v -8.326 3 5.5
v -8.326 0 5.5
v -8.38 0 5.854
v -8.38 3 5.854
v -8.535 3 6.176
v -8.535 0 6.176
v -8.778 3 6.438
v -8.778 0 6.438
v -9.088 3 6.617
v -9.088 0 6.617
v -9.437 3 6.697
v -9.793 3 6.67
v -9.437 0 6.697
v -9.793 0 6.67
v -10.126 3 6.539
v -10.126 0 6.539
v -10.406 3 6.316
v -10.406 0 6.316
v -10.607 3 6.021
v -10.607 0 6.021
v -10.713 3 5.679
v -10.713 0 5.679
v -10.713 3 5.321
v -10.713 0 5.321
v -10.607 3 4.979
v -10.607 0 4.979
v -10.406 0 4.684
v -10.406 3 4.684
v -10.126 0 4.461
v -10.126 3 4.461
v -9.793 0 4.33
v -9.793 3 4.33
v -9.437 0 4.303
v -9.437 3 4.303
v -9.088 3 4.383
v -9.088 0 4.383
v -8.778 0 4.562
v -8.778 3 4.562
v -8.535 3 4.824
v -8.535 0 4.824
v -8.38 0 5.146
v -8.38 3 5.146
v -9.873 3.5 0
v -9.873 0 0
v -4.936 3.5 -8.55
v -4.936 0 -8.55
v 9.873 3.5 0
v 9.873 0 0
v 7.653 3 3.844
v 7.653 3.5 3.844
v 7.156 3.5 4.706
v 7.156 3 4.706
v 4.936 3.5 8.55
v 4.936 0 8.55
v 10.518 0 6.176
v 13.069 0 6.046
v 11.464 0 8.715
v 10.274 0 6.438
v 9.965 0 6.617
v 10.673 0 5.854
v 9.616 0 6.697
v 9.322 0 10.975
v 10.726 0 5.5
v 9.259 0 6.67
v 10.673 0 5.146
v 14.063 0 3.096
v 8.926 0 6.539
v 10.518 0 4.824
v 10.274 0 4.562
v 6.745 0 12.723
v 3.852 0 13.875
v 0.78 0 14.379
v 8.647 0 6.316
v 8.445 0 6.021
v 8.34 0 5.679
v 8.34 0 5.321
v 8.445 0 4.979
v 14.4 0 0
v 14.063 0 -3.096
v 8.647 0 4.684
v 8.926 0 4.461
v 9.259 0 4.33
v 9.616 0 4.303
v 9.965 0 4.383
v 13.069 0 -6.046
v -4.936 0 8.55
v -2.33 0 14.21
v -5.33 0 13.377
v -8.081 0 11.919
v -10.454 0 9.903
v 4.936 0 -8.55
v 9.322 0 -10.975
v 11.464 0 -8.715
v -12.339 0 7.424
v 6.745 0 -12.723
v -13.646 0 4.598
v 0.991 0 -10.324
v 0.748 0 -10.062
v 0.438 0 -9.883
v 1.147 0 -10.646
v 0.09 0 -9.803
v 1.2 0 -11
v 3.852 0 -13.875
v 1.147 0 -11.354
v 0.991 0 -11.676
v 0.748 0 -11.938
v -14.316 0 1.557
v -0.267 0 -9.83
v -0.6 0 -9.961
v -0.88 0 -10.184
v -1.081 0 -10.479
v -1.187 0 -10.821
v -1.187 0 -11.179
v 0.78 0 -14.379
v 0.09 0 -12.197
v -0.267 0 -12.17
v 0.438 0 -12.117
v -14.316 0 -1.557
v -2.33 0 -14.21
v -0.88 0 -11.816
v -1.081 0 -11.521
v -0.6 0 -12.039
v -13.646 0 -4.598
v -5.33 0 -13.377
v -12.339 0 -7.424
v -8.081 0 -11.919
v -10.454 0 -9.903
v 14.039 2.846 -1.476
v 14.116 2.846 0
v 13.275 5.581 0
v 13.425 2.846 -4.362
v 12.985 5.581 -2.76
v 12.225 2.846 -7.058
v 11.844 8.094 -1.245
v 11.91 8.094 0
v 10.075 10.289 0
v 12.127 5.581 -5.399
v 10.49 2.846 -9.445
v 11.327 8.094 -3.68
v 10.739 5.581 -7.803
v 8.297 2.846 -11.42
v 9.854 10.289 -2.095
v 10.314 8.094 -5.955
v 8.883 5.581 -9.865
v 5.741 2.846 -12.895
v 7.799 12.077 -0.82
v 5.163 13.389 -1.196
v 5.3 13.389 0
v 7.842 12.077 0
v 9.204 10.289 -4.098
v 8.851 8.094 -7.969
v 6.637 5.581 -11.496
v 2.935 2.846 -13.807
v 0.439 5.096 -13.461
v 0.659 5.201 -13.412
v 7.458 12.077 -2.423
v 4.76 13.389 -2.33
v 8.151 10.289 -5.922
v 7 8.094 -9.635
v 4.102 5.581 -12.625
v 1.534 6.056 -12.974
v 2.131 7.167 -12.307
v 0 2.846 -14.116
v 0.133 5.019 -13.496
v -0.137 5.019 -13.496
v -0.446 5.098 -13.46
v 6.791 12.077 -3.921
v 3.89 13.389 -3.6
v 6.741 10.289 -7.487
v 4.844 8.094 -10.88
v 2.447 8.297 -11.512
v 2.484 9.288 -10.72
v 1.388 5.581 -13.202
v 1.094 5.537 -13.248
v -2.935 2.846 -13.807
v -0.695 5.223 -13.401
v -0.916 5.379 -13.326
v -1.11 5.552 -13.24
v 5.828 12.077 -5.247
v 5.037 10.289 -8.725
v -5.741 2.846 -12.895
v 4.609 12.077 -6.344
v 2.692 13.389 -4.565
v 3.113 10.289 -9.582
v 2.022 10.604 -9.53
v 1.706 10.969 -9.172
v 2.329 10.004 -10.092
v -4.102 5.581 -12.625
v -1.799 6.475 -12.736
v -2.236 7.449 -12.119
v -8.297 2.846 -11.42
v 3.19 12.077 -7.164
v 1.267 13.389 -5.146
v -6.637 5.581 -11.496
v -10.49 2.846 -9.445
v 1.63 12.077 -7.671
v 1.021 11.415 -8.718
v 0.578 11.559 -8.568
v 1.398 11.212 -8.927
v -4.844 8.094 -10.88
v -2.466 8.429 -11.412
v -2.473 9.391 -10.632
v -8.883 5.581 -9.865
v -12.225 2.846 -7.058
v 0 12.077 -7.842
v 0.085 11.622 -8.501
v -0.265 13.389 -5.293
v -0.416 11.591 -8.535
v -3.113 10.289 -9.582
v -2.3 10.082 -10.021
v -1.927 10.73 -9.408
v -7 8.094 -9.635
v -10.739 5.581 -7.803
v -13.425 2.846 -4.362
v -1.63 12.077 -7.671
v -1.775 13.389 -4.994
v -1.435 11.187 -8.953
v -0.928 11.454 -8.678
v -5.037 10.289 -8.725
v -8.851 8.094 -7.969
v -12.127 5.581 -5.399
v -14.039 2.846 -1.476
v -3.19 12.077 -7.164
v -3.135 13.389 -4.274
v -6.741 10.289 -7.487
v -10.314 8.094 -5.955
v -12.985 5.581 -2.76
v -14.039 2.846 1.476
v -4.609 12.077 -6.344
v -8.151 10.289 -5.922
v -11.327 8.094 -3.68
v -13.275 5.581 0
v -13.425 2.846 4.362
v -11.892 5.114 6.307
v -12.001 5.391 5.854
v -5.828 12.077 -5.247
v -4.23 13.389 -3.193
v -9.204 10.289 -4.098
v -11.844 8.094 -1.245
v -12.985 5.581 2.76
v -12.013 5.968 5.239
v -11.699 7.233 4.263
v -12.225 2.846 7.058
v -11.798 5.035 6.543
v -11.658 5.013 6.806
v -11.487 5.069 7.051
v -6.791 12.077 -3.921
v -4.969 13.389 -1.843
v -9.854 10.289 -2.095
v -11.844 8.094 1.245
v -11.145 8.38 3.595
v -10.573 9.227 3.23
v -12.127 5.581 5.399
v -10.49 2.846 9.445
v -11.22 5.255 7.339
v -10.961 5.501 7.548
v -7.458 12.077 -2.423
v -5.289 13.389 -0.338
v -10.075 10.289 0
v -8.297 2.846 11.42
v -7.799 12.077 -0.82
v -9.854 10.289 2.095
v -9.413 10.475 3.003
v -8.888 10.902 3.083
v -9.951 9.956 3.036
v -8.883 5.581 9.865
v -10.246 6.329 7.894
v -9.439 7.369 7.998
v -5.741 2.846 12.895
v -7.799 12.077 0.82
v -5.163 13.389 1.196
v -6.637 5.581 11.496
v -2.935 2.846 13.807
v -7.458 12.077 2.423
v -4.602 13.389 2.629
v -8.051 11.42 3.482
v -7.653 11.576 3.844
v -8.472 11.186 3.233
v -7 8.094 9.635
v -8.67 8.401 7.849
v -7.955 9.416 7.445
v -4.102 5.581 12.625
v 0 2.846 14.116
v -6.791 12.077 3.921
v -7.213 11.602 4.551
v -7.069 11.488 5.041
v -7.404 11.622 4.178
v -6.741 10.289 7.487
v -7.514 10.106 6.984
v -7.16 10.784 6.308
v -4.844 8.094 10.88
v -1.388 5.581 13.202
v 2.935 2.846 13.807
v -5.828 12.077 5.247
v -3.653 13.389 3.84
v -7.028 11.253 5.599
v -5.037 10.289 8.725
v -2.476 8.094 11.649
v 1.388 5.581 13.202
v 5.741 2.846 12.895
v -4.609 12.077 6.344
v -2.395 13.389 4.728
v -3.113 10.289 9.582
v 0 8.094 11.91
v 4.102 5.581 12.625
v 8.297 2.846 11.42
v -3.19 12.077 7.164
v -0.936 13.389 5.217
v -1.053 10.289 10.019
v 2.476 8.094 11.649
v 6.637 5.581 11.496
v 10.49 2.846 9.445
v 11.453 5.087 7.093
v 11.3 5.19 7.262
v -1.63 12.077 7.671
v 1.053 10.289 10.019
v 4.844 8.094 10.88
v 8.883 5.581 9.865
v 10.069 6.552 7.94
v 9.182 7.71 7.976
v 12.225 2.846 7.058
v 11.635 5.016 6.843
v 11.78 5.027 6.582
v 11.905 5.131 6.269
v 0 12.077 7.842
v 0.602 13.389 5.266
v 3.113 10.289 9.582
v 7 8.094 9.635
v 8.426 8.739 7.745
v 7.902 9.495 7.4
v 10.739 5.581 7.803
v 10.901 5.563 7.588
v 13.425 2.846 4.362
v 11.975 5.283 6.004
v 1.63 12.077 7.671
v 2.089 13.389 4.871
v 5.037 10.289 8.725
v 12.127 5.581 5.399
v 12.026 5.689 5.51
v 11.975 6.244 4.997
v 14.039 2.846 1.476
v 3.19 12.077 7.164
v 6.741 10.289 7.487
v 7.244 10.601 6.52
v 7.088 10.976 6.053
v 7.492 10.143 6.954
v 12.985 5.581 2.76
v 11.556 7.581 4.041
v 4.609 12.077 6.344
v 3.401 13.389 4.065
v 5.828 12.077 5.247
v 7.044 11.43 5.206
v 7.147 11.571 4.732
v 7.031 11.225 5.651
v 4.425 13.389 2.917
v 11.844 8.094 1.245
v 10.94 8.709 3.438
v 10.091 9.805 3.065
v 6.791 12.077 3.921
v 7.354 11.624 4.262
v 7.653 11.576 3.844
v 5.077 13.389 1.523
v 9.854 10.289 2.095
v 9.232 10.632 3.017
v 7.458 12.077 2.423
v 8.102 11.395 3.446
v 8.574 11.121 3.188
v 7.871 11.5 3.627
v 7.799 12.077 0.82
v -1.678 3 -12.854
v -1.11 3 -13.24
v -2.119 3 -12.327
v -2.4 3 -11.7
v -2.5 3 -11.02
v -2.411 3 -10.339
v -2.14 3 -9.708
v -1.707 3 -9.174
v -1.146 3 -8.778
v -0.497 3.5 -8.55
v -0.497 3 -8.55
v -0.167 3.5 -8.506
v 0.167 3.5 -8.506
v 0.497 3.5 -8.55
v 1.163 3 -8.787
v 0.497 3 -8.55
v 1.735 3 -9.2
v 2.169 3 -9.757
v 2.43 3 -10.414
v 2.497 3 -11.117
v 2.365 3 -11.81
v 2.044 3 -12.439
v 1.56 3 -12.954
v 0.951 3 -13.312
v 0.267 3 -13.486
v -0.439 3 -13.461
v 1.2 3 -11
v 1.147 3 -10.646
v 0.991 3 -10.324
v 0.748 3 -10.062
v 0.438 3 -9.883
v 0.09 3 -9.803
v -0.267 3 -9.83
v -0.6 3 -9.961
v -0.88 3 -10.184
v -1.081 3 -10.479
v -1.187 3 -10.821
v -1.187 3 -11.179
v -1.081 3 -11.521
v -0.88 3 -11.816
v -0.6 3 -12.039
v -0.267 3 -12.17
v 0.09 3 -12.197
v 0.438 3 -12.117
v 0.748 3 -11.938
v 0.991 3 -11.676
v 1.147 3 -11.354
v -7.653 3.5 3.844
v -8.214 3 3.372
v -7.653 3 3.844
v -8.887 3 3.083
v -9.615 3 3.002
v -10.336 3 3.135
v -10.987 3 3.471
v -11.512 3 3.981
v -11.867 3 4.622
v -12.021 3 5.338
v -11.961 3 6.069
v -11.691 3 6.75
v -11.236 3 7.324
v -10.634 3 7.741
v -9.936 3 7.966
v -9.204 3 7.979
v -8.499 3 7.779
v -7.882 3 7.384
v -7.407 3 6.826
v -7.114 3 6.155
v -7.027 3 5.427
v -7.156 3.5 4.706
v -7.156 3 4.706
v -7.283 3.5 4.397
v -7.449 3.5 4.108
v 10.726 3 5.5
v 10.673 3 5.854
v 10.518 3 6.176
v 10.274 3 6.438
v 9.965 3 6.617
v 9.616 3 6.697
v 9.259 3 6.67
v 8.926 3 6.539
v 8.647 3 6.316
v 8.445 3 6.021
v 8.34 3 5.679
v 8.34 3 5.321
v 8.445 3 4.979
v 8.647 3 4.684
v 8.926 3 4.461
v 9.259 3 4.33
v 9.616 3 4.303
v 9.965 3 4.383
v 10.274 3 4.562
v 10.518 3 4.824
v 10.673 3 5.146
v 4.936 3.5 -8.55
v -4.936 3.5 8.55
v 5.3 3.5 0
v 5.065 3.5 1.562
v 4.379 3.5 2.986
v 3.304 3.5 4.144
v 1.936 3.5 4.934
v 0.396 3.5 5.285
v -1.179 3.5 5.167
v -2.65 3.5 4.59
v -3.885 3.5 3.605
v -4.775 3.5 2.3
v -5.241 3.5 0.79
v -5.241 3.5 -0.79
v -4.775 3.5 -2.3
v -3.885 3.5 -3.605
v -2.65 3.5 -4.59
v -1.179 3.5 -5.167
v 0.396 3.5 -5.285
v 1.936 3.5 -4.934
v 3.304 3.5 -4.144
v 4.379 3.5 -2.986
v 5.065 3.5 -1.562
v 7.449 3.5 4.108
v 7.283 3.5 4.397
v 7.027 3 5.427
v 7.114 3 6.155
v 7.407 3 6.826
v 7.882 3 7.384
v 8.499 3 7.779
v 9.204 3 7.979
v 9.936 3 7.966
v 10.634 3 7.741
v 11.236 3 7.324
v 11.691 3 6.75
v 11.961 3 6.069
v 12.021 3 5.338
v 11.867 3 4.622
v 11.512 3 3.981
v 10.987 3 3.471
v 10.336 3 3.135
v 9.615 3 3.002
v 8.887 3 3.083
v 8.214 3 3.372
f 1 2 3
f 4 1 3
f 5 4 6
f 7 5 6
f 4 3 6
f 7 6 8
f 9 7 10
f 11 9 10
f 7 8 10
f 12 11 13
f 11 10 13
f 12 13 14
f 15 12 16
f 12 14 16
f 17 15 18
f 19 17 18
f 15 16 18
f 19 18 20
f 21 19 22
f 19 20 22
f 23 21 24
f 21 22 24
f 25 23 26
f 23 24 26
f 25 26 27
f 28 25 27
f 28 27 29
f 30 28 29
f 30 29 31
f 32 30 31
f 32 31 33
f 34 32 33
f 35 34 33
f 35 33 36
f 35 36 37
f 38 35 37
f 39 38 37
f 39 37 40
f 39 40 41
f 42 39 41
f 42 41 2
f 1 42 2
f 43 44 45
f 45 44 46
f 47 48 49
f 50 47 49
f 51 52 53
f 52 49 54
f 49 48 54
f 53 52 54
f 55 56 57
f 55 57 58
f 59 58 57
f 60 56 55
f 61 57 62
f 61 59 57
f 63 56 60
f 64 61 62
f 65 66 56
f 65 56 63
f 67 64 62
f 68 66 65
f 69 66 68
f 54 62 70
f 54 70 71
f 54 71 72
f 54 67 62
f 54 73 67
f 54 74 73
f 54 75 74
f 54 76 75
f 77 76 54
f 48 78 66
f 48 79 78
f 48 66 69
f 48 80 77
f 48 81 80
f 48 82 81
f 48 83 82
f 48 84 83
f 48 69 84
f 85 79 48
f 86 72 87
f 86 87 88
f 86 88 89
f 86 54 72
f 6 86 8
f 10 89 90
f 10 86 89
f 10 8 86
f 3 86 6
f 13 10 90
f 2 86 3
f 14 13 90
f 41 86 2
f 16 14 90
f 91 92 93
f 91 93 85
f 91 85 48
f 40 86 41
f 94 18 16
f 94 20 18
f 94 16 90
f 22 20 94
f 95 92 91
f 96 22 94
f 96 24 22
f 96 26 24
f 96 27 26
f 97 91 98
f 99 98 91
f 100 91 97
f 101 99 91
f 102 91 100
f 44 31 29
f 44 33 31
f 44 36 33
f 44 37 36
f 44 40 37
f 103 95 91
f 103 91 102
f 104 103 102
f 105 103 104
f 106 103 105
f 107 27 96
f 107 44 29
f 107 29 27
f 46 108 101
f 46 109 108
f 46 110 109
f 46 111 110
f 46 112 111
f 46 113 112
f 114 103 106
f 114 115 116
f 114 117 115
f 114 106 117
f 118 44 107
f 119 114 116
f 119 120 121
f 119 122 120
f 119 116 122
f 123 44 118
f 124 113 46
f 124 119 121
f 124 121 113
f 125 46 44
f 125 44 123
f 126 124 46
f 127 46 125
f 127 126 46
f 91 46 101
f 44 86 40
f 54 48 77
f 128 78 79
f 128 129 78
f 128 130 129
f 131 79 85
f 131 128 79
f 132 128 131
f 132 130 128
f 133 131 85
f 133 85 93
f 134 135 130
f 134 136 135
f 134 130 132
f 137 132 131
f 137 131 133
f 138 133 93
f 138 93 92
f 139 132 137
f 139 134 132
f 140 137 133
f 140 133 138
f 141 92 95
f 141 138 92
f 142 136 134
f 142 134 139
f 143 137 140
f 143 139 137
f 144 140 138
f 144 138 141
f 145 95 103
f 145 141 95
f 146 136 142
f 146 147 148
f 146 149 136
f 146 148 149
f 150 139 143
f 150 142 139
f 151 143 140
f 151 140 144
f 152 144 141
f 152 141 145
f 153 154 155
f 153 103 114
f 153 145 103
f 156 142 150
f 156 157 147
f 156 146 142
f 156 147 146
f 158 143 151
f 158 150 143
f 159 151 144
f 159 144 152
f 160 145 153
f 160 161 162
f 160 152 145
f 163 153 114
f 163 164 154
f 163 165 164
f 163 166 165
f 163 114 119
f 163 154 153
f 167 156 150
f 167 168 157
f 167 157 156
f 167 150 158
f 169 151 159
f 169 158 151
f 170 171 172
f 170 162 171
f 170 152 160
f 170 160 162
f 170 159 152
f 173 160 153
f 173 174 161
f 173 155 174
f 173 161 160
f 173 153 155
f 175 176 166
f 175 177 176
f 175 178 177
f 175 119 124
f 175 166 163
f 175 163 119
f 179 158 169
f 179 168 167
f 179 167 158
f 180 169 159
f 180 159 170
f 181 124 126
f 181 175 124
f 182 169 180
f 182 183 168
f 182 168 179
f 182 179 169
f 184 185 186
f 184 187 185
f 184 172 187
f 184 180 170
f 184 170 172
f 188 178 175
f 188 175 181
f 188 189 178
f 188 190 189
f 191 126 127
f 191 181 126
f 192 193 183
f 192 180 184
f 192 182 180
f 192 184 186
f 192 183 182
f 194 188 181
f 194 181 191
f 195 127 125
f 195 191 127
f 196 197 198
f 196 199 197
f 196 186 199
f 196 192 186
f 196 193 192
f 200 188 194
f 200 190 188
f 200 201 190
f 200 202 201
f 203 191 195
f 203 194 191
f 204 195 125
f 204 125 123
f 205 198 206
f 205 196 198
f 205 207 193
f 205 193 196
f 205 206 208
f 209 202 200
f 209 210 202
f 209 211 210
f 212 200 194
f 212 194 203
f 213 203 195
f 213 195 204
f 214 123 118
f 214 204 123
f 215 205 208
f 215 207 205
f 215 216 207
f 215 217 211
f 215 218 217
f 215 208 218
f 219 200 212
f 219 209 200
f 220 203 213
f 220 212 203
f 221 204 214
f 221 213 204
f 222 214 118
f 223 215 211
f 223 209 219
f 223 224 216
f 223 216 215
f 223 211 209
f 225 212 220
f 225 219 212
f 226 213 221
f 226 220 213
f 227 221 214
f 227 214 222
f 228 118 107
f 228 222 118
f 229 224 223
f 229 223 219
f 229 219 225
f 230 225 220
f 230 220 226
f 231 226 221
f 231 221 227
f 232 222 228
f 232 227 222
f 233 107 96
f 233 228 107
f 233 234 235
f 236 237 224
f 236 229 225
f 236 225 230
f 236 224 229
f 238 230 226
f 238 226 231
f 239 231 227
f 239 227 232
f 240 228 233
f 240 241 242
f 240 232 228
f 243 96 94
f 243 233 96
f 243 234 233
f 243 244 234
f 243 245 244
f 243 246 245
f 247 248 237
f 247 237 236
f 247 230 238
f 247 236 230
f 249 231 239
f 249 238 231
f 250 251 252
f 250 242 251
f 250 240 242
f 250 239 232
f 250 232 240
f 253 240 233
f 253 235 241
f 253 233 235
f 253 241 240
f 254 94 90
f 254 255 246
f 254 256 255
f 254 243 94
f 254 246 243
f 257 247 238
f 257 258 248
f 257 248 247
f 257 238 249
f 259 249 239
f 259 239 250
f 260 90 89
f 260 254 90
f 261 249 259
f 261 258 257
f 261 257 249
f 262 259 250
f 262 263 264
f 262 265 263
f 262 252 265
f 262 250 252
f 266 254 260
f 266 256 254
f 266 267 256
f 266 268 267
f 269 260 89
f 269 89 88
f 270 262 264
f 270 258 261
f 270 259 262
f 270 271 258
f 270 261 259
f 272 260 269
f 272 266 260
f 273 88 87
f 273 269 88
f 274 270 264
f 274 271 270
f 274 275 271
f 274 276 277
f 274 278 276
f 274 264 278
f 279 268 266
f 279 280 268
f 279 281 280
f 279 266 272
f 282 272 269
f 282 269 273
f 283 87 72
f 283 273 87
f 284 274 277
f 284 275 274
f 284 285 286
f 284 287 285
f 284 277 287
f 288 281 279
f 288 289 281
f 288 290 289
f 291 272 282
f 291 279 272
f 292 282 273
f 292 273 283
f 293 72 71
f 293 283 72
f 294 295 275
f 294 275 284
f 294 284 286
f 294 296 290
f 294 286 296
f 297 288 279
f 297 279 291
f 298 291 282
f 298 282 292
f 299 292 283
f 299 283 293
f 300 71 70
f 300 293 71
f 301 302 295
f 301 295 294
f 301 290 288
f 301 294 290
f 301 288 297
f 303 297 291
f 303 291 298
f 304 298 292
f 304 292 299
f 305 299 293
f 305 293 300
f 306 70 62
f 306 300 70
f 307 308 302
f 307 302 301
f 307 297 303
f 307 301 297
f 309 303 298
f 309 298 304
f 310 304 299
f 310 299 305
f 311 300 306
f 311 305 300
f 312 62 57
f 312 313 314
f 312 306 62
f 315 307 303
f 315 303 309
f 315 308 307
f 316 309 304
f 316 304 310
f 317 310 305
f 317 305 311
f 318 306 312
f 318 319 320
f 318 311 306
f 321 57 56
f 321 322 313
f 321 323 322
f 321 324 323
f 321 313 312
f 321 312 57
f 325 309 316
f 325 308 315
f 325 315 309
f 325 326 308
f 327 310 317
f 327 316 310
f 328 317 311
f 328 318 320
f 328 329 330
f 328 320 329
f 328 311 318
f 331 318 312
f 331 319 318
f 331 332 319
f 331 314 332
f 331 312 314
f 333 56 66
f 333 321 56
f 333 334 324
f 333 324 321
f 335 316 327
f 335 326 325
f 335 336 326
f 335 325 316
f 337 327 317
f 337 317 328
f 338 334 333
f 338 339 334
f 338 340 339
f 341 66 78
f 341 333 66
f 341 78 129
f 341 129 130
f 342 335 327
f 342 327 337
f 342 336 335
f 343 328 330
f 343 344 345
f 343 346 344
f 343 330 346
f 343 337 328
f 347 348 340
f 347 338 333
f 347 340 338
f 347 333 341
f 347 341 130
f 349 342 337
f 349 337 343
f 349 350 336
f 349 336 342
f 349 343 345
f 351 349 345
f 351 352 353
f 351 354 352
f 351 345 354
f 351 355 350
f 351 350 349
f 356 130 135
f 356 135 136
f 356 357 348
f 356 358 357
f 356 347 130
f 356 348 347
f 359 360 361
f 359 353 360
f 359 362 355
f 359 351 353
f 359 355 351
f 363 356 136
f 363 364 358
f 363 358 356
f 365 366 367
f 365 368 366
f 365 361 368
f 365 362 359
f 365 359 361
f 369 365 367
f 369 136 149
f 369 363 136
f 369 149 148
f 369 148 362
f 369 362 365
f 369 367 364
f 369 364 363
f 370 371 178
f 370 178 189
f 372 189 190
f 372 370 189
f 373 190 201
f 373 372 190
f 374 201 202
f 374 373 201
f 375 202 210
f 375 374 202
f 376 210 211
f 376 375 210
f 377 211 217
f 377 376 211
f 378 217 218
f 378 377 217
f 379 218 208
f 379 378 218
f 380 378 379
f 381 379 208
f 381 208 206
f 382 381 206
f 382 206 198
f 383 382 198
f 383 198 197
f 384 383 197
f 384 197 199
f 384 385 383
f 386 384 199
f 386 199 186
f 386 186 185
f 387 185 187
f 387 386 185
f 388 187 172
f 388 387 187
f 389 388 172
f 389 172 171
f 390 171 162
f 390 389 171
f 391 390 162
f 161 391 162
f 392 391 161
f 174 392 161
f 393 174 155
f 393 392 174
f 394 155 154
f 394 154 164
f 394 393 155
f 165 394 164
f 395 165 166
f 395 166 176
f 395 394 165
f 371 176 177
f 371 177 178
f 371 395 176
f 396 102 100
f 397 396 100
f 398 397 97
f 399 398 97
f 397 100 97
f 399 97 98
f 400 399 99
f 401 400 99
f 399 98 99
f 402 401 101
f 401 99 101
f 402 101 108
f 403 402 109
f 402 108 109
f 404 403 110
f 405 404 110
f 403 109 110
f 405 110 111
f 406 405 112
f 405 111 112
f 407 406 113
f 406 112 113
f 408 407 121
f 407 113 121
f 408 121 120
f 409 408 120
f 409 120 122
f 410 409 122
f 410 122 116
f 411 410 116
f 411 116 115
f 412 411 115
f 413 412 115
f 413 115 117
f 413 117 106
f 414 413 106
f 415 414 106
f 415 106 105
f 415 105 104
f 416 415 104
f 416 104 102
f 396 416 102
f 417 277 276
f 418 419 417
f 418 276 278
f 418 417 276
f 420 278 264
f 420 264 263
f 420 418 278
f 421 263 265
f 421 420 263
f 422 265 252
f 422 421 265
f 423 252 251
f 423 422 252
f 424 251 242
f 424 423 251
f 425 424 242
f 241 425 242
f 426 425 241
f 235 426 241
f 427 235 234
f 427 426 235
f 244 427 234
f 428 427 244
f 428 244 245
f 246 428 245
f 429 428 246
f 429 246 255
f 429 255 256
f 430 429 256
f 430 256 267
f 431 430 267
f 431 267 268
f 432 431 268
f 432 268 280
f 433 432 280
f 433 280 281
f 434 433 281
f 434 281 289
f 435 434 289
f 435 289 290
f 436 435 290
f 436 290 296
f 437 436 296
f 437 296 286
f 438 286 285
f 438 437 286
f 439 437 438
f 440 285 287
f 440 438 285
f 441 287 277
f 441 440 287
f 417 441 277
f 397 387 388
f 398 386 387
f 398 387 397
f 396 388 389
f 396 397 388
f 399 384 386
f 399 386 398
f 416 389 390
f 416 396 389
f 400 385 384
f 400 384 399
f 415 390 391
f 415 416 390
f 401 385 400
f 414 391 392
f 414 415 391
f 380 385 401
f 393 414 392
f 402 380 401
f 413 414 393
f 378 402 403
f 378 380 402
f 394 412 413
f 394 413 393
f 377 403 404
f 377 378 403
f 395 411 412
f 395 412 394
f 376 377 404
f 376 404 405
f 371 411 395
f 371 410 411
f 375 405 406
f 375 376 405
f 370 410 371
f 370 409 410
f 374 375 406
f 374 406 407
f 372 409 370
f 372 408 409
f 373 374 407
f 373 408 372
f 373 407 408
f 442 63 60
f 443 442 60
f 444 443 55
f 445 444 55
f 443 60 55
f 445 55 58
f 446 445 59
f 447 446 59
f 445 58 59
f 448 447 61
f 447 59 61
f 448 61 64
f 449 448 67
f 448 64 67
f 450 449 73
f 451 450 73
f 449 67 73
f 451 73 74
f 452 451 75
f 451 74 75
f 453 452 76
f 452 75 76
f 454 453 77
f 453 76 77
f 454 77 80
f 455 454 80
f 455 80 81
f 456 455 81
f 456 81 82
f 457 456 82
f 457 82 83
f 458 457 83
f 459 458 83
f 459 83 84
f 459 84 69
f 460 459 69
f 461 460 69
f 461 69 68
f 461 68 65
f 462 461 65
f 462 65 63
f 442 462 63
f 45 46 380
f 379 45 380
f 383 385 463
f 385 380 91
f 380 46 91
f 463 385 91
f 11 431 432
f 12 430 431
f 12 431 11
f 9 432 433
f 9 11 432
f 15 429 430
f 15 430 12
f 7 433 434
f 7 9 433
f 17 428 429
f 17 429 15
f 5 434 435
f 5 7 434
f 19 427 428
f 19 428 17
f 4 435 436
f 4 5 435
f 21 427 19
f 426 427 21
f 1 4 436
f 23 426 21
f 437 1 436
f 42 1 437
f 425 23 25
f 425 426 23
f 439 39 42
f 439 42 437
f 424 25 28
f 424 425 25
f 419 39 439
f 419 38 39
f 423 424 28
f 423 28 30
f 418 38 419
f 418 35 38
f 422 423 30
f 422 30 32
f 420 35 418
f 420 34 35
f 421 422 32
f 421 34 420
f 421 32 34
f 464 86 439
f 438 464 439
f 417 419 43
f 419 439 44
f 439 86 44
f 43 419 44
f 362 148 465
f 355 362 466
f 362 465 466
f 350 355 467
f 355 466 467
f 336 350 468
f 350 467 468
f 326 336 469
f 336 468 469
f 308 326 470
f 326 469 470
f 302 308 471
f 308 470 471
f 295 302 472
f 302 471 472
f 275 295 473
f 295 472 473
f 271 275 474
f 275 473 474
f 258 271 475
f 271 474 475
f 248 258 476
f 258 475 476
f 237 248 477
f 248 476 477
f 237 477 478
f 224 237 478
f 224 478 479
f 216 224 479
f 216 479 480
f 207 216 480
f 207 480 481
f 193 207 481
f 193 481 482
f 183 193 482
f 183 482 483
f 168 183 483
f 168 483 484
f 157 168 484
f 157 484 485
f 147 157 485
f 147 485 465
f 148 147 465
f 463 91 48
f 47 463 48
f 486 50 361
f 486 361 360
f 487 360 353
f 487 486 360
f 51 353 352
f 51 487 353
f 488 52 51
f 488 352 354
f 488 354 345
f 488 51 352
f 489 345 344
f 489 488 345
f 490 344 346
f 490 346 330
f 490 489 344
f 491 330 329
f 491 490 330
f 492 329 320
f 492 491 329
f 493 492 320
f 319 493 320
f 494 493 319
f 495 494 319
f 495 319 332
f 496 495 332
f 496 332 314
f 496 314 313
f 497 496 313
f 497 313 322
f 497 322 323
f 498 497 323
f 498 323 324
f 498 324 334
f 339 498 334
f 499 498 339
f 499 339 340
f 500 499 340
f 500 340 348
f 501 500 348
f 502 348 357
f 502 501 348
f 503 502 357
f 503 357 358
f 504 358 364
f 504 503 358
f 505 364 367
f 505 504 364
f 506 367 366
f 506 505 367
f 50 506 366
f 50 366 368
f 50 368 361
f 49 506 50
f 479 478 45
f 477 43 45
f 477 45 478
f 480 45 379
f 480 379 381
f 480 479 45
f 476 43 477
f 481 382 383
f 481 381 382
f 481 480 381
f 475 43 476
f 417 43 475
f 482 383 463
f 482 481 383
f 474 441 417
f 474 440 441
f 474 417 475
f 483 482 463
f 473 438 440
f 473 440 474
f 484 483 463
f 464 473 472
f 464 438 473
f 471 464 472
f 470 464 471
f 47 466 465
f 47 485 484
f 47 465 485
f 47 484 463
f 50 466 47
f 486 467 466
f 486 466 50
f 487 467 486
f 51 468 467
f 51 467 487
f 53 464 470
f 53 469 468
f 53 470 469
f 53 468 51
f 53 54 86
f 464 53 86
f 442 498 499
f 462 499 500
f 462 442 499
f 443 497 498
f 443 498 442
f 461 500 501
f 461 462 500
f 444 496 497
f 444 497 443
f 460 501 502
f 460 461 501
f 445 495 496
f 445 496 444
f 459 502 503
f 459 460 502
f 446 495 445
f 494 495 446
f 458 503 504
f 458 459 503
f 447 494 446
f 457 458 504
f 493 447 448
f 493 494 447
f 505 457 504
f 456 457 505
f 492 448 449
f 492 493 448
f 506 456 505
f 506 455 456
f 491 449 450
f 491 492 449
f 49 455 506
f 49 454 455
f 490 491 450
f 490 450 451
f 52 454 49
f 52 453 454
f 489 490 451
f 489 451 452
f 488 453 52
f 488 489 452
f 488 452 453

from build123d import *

# Parameters (mm, degrees)
CUT_EXTRUDE2_DEPTH = 3.5
SKETCH7_R          = 1.2
CUT_EXTRUDE6_DEPTH = 7
SKETCH3_R          = 5.3
CUT_EXTRUDE7_DEPTH = 24.098268333
CUT_EXTRUDE8_START = 3
SKETCH8_R          = 2.5
CUT_EXTRUDE8_DEPTH = 22.371910061


with BuildPart() as part:
    # Sketch1 → Revolve1 (revolve)
    with BuildSketch(Plane.XY):
        with BuildLine():
            ThreePointArc((0, 14.4), (-10.182337649, 10.182337649), (-14.4, 0))
            Line((-14.4, 0), (0, 0))
            Line((0, 0), (0, 14.4))
        make_face()
    revolve(axis=Axis((0, -1000, 0), (0, 1, 0)))

    # Sketch2 → Cut-Extrude2 (cut)
    with BuildSketch(Plane.XZ):
        Polygon((4.936344802, -8.55), (9.872689603, 0), (4.936344802, 8.55), (-4.936344802, 8.55), (-9.872689603, 0), (-4.936344802, -8.55), align=None)
    extrude(amount=-CUT_EXTRUDE2_DEPTH, mode=Mode.SUBTRACT)

    # Sketch7 → Cut-Extrude6 (cut)
    with BuildSketch(Plane.XZ):
        with Locations((-9.526279442, 5.5)):
            Circle(SKETCH7_R)
        with Locations((9.526279442, 5.5)):
            Circle(SKETCH7_R)
        with Locations((0, -11)):
            Circle(SKETCH7_R)
    extrude(amount=-CUT_EXTRUDE6_DEPTH, mode=Mode.SUBTRACT)

    # Sketch3 → Cut-Extrude7 (cut, through all)
    with BuildSketch(Plane.XZ.offset(-3.5)):
        Circle(SKETCH3_R)
    extrude(amount=-CUT_EXTRUDE7_DEPTH, mode=Mode.SUBTRACT)

    # Sketch8 → Cut-Extrude8 (cut, through all)
    with BuildSketch(Plane(origin=(0, 0, 0), x_dir=(1, 0, 0), z_dir=(0, 1, 0)).offset(CUT_EXTRUDE8_START)):
        with Locations((-9.526279442, -5.5)):
            Circle(SKETCH8_R)
        with Locations((0, 11)):
            Circle(SKETCH8_R)
        with Locations((9.526279442, -5.5)):
            Circle(SKETCH8_R)
    extrude(amount=CUT_EXTRUDE8_DEPTH, mode=Mode.SUBTRACT)


solid = part.part
